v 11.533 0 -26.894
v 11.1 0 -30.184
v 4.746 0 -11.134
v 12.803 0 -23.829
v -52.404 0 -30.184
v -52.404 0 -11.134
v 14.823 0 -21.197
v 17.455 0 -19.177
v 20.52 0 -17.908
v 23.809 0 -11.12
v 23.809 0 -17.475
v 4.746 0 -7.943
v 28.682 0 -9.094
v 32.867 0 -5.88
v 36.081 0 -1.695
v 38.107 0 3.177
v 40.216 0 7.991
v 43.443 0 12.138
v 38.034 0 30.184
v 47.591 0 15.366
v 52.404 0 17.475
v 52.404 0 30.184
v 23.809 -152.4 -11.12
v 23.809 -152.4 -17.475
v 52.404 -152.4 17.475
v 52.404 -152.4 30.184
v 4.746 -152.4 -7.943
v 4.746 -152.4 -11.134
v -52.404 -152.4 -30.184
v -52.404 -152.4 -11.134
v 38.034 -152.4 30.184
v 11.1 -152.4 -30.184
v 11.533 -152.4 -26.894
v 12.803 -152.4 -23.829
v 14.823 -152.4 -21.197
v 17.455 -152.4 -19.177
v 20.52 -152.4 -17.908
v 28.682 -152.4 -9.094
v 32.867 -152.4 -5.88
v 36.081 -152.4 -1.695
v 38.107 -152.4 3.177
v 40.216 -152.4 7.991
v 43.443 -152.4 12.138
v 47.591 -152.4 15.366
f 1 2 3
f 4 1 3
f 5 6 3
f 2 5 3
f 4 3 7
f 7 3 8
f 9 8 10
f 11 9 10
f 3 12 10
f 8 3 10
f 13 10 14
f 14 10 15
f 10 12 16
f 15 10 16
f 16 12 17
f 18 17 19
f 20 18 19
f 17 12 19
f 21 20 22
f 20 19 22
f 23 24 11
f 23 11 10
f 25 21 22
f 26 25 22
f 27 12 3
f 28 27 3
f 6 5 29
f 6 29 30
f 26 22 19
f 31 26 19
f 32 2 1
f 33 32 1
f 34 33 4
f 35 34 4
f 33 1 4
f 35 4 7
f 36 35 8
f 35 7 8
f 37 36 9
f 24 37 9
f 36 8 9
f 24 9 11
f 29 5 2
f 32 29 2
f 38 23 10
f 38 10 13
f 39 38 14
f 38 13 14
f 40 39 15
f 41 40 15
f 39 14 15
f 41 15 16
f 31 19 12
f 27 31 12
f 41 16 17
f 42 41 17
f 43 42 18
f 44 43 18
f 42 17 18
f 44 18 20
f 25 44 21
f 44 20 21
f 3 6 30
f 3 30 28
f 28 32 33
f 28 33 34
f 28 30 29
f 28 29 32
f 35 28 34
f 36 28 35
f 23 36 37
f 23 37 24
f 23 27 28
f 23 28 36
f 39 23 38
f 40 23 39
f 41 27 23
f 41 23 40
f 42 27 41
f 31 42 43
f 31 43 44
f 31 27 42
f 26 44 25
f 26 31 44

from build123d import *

# Parameters (mm, degrees)
F0_W     = 57.15
F0_H     = 19.05
F1_DEPTH = 152.4


# Not quite as in the source:
# - ends of sketch curves that miss each other by under 0.0002 mm in the source are joined


with BuildPart() as f1:
    # F0 (on Front) → F1 (new body)
    with BuildSketch(Plane.XZ):
        with BuildLine():
            Line((4.745863, -11.1335566), (4.745863, -30.1835566))
            Line((4.745863, -30.1835566), (11.100308, -30.1835566))
            ThreePointArc((11.100308, -30.1835566), (14.8226482602, -21.1970322602), (23.8091726, -17.474692))
            Line((23.8091726, -17.474692), (23.8091726, -11.120247))
            ThreePointArc((23.8091726, -11.120247), (32.8666183043, -5.8802359043), (38.1066276666, 3.1772102678))
            ThreePointArc((38.1066276666, 3.1772102678), (43.4430736289, 12.1382508388), (52.4041076698, 17.4747052267))
            Line((52.4041076698, 17.4747052267), (52.4041116, 30.1835566))
            Line((52.4041116, 30.1835566), (38.0344934, 30.1835566))
            Line((38.0344934, 30.1835566), (4.745863, -7.9430372))
            Line((4.745863, -7.9430372), (4.745863, -11.1335566))
        make_face()
        with Locations((-23.829137, -20.6585566)):
            Rectangle(F0_W, F0_H)
    extrude(amount=F1_DEPTH)


solid = f1.part
